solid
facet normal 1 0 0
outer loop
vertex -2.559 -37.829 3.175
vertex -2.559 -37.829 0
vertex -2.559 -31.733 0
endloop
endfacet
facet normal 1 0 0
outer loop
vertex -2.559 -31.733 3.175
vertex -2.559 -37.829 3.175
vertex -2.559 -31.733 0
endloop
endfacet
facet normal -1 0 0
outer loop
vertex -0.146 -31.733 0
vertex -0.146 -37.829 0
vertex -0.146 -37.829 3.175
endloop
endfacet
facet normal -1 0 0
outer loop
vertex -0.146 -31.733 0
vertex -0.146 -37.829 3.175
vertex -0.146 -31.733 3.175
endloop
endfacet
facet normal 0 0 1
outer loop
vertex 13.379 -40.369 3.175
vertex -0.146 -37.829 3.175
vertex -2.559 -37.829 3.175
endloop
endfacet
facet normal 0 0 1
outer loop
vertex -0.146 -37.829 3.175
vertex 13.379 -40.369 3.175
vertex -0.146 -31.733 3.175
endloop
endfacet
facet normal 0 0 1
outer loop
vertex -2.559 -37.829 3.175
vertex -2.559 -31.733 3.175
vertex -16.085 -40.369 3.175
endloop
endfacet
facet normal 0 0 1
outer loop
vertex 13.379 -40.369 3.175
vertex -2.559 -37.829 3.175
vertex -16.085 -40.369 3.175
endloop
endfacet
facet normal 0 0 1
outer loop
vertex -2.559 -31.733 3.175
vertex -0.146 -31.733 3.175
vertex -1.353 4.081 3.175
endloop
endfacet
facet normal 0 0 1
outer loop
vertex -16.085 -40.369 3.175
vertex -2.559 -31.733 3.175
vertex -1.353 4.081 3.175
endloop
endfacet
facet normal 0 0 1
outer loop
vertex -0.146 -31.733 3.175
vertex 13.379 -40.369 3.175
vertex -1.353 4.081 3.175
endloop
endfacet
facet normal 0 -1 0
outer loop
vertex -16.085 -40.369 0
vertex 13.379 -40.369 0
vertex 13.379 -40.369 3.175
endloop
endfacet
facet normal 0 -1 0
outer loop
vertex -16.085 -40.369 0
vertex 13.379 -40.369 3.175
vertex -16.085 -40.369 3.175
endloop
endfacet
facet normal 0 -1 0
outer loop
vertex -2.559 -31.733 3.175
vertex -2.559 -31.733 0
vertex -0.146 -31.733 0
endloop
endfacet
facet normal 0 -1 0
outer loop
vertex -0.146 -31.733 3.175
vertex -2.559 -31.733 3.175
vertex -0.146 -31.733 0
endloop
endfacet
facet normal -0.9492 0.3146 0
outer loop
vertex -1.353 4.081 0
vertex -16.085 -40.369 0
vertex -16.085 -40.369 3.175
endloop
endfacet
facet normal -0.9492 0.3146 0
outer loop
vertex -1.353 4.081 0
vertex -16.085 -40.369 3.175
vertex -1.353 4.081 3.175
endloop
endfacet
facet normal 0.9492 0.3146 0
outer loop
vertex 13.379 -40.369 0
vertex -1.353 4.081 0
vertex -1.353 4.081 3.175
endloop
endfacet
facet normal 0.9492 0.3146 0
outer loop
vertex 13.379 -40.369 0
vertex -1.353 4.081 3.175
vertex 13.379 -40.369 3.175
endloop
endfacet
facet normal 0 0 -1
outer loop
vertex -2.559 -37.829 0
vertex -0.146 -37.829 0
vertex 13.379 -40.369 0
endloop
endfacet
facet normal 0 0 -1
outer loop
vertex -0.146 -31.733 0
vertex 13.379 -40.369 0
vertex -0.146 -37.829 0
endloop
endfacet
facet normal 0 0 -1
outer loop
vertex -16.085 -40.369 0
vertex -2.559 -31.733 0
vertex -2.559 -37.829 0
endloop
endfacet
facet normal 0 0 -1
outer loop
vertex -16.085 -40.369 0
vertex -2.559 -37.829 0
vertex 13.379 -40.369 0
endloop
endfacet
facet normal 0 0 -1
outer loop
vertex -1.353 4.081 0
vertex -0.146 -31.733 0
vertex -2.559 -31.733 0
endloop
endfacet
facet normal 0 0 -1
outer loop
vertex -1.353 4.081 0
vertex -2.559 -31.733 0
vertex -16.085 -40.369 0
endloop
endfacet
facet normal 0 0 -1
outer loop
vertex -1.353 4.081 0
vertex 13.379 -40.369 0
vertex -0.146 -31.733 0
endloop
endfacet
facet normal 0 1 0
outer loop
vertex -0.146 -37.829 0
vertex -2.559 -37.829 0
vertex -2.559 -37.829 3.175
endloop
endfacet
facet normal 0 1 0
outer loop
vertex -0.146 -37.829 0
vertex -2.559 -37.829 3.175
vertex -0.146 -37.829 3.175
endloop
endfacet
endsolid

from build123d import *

# Parameters (mm, degrees)
SKETCH2_W           = 2.413
SKETCH2_H           = 6.096
BOSS_EXTRUDE1_DEPTH = 3.175


with BuildPart() as part:
    # Sketch2 → Boss-Extrude1 (new body)
    with BuildSketch(Plane.XY):
        Polygon((-16.084625597, -40.368802078), (-1.352625597, 4.081197922), (13.379374403, -40.368802078), align=None)
        with Locations((-1.352625597, -34.780802078)):
            Rectangle(SKETCH2_W, SKETCH2_H, mode=Mode.SUBTRACT)
    extrude(amount=BOSS_EXTRUDE1_DEPTH)


solid = part.part
